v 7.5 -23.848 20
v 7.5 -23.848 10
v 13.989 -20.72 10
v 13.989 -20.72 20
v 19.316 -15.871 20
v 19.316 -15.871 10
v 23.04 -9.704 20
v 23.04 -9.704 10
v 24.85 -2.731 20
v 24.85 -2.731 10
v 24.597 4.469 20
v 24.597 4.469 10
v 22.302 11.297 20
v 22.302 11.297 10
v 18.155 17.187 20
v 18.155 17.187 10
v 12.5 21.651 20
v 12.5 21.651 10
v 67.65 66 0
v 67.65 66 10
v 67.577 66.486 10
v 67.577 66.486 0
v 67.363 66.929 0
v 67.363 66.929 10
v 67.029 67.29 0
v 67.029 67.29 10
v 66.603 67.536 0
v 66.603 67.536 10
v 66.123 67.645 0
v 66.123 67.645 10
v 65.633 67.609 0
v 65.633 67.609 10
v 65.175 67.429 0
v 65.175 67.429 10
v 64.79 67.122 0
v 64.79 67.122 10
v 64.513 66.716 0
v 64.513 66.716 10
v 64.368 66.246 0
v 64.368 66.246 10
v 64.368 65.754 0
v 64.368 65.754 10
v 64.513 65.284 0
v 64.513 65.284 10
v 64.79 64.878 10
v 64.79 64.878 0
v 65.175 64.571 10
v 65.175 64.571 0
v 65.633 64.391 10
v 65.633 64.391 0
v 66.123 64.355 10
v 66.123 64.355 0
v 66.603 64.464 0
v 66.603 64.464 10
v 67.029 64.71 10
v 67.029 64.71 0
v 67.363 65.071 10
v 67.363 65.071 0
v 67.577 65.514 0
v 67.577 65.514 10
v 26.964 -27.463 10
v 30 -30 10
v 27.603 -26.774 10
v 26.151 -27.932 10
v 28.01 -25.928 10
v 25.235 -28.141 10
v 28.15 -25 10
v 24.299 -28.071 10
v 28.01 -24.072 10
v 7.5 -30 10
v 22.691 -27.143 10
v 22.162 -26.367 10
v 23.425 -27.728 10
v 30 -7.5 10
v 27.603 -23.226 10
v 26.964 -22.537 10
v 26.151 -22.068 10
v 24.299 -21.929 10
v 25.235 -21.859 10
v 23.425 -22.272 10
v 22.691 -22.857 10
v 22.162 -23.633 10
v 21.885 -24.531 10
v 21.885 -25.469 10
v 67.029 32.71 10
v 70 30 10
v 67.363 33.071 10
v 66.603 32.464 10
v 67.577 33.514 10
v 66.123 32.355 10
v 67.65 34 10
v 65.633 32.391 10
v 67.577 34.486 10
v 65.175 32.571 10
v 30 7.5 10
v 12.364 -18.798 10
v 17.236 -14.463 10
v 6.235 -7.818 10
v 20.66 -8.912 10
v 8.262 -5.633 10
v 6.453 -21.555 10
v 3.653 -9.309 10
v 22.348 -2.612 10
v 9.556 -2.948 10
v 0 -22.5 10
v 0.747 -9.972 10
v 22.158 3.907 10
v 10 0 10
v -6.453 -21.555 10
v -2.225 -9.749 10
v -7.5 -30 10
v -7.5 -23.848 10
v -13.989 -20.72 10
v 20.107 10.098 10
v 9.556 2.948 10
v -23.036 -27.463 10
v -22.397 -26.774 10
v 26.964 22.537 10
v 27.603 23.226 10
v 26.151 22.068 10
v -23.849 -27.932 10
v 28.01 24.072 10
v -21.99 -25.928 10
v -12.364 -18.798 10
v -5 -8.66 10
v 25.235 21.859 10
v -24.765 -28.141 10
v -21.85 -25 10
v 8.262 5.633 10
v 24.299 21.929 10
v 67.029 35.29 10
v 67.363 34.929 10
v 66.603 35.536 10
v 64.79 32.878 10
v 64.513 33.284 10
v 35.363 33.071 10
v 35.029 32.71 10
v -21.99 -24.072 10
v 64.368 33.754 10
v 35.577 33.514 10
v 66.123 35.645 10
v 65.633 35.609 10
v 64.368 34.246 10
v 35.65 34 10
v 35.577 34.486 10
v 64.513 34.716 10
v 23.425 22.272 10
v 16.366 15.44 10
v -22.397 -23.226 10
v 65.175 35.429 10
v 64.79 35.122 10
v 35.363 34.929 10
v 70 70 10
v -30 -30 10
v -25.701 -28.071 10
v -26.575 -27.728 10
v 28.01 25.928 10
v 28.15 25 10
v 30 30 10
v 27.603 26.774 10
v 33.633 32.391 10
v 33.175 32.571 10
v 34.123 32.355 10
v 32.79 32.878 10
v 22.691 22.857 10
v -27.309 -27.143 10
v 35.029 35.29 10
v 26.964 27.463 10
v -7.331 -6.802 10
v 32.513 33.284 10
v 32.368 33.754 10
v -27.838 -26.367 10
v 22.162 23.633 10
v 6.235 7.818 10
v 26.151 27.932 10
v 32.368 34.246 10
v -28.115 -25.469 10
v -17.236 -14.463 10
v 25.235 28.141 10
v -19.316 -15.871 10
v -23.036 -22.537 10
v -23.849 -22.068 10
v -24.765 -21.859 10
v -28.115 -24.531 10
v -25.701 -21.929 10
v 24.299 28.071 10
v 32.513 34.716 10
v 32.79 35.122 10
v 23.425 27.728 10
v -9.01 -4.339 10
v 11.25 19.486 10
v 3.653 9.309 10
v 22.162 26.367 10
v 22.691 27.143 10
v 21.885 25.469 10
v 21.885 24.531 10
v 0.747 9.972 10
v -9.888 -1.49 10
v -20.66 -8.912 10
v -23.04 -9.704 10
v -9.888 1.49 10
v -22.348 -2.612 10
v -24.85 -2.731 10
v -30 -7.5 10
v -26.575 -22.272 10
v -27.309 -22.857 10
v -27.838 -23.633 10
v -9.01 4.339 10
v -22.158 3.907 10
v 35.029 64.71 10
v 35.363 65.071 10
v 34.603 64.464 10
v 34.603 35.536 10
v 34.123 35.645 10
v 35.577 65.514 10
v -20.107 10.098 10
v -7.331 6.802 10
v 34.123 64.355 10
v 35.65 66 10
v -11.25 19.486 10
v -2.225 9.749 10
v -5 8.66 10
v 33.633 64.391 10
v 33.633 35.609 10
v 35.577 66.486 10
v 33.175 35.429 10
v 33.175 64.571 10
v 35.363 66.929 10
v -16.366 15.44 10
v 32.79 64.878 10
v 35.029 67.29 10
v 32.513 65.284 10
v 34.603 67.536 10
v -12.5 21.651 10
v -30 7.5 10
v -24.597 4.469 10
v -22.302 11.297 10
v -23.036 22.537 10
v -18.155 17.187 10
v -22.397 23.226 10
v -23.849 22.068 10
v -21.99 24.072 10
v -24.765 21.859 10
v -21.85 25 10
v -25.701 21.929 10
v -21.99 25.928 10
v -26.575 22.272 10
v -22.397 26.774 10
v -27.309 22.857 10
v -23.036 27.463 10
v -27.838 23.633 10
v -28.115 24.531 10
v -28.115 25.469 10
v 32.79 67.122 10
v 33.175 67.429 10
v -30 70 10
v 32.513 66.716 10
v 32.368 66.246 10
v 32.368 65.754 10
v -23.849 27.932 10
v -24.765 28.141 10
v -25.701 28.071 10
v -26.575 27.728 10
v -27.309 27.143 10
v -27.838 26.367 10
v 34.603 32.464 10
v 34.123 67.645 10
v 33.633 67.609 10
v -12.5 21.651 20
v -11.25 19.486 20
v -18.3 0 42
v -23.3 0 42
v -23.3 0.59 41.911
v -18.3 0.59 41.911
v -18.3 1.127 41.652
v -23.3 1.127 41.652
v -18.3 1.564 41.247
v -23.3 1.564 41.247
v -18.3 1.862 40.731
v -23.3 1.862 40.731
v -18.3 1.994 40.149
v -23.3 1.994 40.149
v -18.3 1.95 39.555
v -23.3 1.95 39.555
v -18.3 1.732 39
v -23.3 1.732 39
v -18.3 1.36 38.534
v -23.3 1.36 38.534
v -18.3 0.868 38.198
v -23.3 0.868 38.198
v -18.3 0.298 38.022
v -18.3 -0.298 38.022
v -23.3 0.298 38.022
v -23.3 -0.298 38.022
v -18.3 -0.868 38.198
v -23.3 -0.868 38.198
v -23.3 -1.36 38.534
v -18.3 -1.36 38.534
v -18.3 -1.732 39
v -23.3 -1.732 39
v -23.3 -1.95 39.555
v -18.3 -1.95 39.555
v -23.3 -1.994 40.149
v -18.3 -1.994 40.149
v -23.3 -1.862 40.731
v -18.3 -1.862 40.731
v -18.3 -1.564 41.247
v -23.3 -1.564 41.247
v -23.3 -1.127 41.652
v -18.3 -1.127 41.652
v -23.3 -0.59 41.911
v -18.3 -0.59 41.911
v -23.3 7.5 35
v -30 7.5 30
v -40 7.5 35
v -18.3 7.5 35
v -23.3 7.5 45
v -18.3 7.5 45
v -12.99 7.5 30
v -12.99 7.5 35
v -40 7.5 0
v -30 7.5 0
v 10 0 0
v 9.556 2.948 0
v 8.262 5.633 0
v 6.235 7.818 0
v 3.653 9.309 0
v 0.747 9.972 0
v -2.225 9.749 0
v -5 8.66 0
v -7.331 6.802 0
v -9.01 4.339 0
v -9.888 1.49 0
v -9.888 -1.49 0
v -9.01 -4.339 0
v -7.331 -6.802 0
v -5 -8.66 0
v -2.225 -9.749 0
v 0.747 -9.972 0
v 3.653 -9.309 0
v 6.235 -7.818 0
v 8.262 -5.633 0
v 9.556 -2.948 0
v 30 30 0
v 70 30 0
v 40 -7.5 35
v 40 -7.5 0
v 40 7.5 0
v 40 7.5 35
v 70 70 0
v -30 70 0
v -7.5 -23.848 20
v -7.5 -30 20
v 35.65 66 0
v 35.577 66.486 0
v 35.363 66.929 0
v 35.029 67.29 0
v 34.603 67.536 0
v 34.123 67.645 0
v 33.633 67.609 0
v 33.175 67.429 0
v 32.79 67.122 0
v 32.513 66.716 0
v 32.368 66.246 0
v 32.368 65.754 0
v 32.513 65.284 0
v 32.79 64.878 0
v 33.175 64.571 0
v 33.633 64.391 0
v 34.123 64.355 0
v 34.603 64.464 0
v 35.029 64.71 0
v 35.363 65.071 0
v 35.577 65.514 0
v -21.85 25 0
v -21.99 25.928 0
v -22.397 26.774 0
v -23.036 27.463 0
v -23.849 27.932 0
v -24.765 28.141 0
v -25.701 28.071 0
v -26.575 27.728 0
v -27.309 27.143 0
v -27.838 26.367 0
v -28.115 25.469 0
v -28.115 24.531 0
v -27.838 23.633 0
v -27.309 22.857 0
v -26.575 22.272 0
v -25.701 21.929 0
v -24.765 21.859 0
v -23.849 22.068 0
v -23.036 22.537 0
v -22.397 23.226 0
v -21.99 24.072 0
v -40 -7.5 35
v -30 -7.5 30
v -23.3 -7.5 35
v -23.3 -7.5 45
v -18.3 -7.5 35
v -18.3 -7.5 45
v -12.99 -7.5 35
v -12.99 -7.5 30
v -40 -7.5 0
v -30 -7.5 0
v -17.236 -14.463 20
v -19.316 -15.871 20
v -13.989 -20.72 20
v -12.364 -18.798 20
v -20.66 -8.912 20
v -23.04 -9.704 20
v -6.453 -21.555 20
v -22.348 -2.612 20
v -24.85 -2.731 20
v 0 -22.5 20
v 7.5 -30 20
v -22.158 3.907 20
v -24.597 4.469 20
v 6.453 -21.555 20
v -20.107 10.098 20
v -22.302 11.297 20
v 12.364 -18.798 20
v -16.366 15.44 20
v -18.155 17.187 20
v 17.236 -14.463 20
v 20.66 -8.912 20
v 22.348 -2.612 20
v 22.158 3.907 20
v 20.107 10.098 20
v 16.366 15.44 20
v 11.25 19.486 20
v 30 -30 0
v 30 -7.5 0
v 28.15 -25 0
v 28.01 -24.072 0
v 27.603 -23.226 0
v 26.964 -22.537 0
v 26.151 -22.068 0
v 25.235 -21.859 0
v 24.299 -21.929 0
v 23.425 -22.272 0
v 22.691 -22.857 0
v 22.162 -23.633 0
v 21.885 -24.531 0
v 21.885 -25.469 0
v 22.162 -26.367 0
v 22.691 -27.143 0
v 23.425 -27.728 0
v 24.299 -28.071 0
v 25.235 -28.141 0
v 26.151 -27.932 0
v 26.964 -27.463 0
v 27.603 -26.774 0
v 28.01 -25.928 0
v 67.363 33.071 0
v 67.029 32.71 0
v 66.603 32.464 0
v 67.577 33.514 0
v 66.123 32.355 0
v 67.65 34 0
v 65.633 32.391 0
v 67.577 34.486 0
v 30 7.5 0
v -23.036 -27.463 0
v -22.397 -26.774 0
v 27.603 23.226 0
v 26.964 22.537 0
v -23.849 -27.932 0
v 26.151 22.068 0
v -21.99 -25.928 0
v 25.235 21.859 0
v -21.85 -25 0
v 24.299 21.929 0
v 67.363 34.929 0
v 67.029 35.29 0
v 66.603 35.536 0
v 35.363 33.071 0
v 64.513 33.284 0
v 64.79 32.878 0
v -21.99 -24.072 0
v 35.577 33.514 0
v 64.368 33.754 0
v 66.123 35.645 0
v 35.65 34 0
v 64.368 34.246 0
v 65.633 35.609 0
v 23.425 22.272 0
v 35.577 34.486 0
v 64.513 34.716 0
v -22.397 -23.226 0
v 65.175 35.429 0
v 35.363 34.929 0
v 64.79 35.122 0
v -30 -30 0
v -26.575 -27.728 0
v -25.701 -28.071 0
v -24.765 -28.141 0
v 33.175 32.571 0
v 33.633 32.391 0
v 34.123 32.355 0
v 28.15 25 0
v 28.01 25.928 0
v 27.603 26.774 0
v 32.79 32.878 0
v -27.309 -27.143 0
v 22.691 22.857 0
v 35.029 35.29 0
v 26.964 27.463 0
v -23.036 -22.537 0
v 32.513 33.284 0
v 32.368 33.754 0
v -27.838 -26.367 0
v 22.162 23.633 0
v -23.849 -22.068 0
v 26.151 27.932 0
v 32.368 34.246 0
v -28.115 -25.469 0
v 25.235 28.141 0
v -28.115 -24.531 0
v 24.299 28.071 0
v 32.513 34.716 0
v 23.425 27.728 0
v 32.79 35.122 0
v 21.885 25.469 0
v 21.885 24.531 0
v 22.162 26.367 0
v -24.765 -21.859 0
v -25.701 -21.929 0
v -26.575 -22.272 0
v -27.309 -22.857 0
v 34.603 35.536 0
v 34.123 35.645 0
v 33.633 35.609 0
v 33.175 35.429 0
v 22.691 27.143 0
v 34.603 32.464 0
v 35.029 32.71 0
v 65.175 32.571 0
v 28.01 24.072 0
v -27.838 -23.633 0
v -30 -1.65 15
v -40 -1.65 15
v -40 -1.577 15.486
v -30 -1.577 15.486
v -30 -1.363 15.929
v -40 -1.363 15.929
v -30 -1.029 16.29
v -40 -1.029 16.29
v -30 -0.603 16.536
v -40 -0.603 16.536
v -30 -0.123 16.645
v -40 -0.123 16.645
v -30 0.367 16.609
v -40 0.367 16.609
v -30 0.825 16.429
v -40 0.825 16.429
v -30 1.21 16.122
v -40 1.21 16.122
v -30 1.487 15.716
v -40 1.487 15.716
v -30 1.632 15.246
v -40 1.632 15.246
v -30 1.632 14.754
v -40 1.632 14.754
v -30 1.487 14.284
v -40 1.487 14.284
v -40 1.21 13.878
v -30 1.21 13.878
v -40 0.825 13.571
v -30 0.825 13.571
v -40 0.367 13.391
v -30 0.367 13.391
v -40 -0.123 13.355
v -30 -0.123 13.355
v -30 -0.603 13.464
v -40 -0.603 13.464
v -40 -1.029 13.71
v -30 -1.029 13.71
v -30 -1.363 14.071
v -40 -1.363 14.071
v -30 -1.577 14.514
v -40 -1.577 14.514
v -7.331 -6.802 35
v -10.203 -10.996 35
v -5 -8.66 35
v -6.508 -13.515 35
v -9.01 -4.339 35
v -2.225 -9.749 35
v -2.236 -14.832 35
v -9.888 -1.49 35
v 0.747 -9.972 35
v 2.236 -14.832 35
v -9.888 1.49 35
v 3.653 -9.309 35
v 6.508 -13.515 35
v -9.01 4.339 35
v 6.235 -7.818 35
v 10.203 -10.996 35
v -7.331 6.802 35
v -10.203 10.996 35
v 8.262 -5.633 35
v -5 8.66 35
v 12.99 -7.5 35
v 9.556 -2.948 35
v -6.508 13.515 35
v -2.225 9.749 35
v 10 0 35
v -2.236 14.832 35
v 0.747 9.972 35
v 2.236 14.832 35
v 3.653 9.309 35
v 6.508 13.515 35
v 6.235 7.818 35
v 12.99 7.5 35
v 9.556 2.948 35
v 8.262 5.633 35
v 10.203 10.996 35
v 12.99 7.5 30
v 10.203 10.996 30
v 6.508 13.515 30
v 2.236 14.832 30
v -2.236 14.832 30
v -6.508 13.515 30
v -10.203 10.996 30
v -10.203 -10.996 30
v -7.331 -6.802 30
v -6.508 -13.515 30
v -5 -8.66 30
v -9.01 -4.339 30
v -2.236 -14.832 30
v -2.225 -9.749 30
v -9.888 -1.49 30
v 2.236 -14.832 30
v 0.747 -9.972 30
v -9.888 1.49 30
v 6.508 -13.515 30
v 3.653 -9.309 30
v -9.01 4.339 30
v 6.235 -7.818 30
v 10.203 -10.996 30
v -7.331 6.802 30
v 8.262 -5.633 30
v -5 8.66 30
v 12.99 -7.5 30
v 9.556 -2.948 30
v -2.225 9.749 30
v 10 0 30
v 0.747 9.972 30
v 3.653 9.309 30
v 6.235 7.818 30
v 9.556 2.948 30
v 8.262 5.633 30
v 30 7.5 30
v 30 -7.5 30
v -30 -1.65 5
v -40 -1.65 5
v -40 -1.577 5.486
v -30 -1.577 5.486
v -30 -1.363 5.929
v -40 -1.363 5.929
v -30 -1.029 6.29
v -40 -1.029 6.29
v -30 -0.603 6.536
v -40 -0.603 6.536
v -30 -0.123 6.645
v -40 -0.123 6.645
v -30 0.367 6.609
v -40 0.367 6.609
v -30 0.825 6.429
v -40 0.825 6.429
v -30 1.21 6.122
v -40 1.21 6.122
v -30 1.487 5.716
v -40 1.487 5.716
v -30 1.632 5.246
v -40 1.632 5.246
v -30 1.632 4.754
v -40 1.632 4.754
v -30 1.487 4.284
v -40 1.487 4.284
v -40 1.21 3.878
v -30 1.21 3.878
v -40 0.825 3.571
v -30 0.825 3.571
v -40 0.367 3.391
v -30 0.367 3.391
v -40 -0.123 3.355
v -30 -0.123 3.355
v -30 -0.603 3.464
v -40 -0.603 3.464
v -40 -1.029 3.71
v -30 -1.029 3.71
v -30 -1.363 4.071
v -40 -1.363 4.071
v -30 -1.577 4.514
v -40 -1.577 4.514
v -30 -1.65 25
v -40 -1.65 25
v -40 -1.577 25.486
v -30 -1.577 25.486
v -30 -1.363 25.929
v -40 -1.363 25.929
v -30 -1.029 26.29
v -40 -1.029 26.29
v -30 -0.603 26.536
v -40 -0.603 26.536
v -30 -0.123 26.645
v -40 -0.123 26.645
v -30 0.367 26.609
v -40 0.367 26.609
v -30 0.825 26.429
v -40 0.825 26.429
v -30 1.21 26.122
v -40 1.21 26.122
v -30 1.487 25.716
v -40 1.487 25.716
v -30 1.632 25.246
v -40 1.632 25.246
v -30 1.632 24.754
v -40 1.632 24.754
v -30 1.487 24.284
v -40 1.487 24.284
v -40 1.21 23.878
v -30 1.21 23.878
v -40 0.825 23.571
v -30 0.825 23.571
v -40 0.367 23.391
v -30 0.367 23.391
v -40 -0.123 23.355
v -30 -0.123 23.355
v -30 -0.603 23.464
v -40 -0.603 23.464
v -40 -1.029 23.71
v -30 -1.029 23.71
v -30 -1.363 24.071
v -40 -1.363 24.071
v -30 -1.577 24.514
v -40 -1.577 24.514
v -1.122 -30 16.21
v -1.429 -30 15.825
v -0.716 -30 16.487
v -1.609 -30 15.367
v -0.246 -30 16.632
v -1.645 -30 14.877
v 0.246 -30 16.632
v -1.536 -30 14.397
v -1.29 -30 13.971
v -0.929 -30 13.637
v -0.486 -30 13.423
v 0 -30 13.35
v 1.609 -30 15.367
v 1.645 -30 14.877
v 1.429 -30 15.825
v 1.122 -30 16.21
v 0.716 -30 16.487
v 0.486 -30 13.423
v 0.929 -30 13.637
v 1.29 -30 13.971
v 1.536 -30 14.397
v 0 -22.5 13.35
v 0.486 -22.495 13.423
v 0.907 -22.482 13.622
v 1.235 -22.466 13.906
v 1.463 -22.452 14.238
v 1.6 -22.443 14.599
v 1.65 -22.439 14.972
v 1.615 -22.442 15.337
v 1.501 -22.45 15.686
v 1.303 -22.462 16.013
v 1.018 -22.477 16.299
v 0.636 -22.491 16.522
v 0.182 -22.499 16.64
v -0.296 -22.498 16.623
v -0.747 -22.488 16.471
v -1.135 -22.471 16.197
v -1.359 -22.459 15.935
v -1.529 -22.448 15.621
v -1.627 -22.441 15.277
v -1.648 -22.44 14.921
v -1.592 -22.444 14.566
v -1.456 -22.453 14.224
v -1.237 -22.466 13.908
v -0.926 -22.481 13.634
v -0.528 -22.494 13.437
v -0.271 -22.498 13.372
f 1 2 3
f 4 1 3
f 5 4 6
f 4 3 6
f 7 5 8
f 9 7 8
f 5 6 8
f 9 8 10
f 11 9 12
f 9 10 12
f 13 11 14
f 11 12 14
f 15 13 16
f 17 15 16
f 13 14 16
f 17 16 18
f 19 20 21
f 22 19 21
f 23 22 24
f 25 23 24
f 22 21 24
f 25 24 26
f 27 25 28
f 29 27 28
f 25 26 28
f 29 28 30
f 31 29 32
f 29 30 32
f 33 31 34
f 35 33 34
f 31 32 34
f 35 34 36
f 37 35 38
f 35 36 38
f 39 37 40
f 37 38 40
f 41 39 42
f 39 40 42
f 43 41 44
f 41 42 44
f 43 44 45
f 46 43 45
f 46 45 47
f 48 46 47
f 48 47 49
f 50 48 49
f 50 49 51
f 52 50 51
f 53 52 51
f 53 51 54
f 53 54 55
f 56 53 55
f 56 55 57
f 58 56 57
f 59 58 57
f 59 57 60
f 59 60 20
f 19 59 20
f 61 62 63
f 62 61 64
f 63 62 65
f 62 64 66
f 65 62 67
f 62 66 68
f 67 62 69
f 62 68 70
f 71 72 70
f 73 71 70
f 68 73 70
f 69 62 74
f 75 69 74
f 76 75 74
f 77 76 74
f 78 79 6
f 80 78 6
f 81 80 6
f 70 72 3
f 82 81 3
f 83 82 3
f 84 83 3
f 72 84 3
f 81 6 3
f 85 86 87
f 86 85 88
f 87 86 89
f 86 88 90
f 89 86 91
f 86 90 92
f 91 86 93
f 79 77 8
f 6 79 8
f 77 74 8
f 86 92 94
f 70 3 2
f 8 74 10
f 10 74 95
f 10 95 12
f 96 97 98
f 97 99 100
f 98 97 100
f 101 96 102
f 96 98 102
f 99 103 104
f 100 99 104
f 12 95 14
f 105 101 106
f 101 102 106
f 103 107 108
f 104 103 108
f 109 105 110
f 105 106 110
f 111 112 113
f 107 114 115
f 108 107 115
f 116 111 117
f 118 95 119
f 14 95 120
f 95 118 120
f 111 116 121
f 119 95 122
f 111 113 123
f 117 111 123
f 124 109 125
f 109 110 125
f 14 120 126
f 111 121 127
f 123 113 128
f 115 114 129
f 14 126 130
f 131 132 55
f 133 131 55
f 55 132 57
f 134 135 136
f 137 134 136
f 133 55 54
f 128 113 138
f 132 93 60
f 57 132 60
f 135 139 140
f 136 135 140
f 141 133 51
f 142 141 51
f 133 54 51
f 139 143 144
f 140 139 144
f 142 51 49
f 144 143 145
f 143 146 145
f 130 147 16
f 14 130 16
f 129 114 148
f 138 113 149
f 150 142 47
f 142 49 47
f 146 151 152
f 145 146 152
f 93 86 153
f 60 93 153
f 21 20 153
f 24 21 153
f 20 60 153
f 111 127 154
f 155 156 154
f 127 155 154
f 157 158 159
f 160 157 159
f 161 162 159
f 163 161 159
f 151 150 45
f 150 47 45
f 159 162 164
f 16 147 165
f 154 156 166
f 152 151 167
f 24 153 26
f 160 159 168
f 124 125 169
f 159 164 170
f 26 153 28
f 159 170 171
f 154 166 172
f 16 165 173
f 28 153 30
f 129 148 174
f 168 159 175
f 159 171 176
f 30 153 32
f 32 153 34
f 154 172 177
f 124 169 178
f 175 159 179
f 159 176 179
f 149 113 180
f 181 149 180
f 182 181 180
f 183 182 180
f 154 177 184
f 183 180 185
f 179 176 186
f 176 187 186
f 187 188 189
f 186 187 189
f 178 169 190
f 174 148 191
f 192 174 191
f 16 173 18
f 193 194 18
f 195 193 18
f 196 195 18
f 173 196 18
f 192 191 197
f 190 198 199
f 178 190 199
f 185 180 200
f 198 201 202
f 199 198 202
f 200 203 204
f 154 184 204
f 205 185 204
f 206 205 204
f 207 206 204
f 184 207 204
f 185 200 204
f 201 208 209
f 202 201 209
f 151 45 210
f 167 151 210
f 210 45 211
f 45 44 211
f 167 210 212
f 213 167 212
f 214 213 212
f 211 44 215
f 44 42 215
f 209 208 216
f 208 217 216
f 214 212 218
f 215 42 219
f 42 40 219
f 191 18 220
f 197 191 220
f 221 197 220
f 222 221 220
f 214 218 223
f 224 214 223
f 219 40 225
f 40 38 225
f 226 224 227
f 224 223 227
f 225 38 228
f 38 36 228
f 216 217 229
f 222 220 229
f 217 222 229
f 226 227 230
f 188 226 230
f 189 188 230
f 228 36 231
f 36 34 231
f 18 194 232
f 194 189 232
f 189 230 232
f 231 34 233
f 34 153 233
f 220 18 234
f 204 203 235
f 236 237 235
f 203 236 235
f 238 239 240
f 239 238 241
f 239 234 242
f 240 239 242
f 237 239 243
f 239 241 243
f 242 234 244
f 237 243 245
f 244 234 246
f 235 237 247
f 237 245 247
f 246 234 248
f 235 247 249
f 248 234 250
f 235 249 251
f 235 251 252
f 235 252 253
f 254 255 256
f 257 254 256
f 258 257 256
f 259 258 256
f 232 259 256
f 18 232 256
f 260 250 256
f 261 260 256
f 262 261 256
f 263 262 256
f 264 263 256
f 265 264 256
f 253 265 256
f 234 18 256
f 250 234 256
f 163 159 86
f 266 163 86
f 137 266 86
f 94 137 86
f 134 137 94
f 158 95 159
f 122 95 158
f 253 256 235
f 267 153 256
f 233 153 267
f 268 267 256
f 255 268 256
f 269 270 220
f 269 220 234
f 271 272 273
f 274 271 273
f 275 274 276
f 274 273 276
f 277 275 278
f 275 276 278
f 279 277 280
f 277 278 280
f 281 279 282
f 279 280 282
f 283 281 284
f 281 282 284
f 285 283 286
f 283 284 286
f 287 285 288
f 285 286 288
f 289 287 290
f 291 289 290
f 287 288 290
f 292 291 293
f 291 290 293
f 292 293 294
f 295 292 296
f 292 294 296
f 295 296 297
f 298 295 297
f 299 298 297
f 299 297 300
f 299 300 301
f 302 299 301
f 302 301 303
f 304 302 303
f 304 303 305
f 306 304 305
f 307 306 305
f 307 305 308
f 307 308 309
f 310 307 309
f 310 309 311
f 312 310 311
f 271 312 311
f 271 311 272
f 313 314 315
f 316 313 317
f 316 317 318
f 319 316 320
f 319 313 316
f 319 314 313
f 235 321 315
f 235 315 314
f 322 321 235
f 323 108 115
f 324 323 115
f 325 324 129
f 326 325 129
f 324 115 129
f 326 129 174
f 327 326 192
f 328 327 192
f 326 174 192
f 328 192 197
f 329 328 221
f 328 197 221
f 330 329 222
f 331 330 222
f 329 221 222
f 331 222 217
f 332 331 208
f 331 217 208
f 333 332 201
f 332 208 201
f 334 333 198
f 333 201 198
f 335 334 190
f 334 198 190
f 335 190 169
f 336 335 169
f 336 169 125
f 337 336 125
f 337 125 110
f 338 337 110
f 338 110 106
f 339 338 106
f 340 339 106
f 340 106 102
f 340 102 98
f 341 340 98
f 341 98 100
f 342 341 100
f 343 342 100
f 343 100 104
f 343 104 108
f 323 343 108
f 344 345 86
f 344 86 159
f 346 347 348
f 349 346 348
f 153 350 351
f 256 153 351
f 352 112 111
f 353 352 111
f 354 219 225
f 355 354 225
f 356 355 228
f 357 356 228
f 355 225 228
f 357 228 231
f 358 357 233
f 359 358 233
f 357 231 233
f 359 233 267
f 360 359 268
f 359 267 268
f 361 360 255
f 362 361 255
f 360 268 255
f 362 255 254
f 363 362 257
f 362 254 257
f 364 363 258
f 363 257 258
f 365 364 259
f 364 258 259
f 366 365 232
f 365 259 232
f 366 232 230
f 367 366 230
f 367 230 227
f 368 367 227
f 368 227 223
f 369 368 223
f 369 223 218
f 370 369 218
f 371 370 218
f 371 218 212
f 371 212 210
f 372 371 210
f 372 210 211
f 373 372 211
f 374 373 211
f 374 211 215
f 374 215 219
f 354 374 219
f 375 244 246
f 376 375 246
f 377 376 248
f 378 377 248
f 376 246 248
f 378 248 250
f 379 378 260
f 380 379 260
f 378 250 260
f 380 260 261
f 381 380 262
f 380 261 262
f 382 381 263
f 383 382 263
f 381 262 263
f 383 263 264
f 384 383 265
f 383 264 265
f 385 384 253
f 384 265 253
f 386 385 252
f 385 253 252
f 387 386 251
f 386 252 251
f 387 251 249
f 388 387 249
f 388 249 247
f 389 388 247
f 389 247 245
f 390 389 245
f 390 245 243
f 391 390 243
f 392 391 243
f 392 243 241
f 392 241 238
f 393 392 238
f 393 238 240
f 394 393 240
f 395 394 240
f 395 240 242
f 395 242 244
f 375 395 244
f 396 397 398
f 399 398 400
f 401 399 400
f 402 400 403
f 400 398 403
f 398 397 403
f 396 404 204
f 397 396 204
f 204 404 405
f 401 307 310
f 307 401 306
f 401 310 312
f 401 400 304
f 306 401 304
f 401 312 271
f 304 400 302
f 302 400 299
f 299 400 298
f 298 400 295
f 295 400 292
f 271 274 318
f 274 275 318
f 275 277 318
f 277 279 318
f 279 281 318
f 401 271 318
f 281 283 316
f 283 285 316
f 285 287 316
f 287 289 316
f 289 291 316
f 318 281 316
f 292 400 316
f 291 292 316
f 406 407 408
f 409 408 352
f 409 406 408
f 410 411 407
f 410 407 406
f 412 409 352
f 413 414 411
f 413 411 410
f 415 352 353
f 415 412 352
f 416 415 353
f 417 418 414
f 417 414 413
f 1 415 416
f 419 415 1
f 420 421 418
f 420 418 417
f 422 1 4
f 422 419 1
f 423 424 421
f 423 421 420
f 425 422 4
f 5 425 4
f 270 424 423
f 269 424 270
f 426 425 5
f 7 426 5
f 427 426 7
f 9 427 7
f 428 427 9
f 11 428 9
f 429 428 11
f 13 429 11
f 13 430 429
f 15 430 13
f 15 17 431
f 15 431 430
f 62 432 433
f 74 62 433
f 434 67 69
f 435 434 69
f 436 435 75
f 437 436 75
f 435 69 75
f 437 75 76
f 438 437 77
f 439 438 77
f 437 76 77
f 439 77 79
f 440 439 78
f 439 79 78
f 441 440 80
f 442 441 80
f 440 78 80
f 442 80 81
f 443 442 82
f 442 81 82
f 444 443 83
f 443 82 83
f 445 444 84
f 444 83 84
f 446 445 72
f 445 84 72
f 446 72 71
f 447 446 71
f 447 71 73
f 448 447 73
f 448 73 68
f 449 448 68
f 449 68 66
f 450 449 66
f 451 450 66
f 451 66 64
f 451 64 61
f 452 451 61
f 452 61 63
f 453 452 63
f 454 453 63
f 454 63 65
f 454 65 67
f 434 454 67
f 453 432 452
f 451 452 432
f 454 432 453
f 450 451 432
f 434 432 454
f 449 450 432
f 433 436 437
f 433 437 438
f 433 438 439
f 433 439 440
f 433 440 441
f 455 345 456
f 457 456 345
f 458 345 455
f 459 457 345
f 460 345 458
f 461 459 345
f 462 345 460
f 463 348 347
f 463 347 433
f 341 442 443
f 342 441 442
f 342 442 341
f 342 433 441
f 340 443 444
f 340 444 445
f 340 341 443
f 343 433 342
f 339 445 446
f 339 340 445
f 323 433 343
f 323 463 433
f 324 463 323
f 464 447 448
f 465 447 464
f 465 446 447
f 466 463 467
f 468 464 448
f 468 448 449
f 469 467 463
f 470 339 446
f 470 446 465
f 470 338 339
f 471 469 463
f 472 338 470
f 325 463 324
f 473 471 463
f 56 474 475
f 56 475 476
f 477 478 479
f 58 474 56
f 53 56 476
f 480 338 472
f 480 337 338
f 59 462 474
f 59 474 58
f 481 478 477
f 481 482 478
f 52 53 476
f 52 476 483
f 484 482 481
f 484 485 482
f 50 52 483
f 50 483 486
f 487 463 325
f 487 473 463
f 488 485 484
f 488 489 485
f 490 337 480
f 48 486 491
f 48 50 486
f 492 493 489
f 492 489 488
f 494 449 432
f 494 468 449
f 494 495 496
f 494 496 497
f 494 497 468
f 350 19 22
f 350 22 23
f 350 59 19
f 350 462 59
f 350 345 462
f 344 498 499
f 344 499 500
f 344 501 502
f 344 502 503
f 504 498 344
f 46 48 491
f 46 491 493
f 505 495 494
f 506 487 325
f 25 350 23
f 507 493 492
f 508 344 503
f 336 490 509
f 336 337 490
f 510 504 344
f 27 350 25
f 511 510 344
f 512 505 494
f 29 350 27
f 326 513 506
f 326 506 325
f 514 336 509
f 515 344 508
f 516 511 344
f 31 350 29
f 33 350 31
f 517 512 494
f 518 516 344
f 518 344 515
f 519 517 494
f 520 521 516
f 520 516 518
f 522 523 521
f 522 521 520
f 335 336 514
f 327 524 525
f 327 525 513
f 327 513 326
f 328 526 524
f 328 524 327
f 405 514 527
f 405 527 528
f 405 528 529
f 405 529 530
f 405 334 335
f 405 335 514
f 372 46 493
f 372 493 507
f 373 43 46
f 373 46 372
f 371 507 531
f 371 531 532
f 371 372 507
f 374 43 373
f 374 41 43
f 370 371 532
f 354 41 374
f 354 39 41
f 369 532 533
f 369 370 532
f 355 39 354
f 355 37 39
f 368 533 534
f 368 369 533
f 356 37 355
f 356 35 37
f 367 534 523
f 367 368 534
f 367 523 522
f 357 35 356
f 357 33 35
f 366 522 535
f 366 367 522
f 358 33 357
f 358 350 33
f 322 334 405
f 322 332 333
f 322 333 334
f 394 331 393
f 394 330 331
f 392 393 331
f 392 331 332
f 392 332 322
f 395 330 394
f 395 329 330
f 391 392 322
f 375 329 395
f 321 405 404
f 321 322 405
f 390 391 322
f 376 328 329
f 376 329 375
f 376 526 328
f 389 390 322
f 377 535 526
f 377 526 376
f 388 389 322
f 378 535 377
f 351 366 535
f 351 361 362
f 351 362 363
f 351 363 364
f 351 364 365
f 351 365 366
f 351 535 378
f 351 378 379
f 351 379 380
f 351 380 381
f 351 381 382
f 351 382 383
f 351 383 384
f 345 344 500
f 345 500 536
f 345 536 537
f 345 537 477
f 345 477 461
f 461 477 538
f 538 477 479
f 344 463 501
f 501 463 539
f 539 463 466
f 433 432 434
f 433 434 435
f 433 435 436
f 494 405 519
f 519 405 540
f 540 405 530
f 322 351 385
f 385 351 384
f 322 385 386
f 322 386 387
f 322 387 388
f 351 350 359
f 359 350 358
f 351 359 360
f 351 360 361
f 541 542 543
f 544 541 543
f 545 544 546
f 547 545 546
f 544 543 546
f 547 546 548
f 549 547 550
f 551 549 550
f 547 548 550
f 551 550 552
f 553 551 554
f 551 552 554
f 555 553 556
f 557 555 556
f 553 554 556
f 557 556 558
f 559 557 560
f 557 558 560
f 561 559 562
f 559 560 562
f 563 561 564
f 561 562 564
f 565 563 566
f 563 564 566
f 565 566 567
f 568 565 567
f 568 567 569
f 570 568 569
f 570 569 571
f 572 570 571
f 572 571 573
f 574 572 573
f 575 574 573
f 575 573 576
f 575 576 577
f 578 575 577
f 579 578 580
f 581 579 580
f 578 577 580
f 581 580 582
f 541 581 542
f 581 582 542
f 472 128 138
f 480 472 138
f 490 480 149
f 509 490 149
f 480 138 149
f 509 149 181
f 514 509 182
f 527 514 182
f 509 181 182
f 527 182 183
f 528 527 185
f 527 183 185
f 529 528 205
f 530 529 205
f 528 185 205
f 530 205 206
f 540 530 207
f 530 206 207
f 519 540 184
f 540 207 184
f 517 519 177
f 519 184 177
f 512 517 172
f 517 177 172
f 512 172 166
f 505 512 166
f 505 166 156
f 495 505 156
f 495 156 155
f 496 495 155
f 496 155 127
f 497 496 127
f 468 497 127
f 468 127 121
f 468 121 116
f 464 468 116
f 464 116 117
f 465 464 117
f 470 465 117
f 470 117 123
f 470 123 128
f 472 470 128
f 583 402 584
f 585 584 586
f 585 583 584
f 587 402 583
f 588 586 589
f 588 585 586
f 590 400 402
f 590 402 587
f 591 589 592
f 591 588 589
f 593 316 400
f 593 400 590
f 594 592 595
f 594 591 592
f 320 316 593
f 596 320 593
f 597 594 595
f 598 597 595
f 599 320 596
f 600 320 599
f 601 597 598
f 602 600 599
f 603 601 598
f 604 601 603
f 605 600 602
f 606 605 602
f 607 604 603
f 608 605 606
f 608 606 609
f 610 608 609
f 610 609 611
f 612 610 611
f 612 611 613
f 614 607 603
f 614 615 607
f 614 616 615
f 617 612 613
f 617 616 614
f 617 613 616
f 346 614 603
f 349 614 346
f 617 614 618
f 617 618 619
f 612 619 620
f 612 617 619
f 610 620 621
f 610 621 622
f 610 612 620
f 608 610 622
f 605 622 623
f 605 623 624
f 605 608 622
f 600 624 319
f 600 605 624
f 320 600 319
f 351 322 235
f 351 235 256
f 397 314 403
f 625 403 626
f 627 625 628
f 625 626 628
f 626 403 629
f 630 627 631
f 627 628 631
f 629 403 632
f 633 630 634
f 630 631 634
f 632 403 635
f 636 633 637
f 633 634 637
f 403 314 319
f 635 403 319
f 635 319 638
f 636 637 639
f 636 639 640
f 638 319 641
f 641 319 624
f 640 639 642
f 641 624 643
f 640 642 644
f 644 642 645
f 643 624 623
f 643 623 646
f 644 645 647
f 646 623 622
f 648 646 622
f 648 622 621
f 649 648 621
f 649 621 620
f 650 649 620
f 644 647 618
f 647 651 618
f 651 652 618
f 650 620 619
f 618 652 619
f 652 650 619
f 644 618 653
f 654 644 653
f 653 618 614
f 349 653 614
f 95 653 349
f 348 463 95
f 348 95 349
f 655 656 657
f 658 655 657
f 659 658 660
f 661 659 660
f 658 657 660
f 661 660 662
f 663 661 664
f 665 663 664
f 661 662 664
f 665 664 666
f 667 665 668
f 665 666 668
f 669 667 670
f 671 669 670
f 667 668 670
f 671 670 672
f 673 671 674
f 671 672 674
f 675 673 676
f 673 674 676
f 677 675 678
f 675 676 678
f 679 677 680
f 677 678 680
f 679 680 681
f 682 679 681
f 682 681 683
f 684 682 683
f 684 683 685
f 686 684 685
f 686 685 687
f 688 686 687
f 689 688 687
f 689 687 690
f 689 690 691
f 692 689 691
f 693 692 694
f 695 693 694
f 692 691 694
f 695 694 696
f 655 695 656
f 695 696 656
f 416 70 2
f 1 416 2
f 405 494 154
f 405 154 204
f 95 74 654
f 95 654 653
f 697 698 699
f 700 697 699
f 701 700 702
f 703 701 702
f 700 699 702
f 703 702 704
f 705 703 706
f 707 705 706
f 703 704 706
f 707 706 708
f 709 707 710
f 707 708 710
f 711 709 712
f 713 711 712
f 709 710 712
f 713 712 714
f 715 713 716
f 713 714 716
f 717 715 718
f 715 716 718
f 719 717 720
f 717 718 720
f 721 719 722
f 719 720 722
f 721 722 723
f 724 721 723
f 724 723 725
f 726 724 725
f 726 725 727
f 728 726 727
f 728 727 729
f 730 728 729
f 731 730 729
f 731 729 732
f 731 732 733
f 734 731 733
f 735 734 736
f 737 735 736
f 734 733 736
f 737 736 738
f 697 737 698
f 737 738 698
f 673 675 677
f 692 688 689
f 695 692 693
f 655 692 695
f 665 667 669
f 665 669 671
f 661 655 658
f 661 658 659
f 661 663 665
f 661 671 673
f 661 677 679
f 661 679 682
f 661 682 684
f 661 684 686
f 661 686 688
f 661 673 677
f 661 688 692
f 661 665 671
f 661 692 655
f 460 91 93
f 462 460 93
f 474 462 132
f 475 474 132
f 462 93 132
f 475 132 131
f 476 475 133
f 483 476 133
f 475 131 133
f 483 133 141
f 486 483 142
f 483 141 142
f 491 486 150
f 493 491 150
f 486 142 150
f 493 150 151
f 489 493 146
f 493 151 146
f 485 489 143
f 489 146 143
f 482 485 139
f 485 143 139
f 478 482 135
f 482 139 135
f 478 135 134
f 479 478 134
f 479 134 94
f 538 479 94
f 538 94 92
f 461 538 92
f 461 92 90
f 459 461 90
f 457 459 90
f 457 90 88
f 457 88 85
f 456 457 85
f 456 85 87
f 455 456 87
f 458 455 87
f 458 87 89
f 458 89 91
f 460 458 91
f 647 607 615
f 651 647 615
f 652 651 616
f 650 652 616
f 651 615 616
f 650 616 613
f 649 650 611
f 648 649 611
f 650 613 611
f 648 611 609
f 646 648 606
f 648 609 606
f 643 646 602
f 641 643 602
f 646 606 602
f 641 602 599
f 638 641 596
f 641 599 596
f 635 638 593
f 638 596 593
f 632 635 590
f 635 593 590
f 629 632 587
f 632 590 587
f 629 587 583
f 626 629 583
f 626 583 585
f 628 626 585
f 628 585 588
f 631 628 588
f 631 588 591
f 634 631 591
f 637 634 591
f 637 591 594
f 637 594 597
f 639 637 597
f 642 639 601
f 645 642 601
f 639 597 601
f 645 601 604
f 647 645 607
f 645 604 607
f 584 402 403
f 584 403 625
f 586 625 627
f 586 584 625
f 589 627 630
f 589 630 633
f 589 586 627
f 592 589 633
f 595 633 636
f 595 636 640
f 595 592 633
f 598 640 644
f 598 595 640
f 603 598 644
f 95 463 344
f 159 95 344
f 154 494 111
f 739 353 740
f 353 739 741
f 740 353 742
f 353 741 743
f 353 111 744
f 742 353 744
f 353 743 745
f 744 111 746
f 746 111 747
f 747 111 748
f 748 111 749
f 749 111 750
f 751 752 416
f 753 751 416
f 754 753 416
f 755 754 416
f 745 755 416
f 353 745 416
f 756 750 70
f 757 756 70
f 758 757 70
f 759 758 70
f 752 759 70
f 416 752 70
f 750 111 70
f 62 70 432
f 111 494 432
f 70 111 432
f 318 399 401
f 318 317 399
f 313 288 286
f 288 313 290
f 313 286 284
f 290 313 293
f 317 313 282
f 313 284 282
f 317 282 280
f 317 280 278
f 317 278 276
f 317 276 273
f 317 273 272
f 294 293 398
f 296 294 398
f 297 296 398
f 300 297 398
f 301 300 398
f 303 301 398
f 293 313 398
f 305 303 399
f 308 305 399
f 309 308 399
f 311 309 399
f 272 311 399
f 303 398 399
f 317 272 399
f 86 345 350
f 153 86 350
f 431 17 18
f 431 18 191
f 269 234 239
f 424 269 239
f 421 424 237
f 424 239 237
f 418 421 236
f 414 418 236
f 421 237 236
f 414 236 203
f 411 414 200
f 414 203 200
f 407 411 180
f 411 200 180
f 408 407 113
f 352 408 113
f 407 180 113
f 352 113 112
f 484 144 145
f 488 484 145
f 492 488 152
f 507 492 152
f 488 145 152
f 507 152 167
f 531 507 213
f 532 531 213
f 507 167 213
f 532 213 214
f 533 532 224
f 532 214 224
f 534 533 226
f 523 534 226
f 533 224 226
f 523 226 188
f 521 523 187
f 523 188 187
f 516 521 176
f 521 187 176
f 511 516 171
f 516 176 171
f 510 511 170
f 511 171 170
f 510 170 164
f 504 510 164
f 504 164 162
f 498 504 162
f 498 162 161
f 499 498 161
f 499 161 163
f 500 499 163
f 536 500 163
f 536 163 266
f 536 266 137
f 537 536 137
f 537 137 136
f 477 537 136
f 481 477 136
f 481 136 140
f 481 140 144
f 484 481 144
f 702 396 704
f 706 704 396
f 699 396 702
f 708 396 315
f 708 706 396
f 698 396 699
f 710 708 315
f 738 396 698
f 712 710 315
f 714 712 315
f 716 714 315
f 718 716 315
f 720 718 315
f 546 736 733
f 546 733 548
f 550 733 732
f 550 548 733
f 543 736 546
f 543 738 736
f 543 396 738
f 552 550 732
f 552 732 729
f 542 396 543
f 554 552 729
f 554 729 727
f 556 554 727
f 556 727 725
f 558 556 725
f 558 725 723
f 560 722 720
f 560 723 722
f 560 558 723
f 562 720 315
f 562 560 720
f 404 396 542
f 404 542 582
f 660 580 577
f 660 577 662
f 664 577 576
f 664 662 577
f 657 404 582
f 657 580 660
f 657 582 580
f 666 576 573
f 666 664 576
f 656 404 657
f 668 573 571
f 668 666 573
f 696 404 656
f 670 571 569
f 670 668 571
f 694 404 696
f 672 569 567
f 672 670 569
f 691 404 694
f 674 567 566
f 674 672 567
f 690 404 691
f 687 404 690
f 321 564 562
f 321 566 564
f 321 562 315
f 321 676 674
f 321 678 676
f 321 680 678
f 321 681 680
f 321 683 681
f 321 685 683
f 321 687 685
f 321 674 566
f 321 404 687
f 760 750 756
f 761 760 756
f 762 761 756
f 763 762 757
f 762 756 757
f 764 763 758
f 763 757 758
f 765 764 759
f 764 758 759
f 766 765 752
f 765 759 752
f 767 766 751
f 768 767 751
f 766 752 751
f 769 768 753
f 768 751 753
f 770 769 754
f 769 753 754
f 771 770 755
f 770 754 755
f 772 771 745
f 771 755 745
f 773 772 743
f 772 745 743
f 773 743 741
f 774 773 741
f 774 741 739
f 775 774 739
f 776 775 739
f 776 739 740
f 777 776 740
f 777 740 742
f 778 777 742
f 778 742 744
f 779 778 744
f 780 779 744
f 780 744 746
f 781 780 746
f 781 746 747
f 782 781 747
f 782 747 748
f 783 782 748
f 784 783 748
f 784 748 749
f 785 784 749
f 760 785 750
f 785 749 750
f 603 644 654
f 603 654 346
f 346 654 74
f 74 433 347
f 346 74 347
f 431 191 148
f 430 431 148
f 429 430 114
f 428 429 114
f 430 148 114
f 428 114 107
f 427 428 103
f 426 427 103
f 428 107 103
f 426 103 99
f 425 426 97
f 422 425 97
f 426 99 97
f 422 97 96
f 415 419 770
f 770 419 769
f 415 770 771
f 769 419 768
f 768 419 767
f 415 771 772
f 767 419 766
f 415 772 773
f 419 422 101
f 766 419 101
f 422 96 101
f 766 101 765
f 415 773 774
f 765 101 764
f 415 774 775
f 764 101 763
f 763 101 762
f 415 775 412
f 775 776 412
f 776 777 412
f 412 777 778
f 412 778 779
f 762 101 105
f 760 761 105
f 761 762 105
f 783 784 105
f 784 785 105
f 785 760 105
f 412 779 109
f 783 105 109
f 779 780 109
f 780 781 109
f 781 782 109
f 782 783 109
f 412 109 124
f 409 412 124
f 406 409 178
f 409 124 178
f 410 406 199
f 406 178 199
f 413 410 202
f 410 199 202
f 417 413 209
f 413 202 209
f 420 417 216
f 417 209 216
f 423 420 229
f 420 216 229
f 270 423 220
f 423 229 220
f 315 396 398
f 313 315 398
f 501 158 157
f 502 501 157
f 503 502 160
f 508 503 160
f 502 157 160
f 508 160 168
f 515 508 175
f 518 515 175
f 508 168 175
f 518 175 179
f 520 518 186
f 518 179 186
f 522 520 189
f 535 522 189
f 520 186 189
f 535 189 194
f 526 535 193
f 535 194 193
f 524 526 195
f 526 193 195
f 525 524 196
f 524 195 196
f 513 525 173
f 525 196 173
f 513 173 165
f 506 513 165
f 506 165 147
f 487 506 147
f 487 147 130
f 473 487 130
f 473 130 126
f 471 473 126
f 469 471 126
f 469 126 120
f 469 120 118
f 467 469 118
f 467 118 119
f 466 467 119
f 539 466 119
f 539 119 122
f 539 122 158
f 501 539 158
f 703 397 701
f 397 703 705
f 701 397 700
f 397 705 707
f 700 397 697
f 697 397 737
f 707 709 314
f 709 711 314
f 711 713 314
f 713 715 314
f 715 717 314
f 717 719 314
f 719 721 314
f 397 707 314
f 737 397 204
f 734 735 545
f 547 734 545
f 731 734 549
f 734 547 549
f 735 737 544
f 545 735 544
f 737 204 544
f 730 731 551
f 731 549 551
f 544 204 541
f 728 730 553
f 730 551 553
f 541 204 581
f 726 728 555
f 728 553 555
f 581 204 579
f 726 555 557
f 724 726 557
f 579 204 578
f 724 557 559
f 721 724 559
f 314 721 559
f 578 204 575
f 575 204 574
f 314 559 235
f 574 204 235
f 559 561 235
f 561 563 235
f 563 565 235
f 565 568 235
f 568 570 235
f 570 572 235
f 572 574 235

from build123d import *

# Parameters (mm, degrees)
SKETCH1_W               = 60
SKETCH1_H               = 60
BOSS_EXTRUDE1_DEPTH     = 10
BOSS_EXTRUDE2_DEPTH     = 10
SKETCH3_R               = 10
CUT_EXTRUDE1_DEPTH      = 44.588989435
SKETCH4_R               = 3.15
CUT_EXTRUDE2_DEPTH      = 44.588989435
SKETCH5_W               = 10
SKETCH5_H               = 15
BOSS_EXTRUDE3_DEPTH     = 45
BOSS_EXTRUDE4_START     = 5
SKETCH6_R               = 10
BOSS_EXTRUDE4_DEPTH     = 5
CUT_EXTRUDE4_REACH      = 87
CUT_EXTRUDE4_END_RADIUS = 22.5
SKETCH7_R               = 1.65
SKETCH8_W               = 11.7
SKETCH8_H               = 15
BOSS_EXTRUDE5_DEPTH     = 10
SKETCH9_W               = 16.7
SKETCH9_H               = 10
CUT_EXTRUDE5_DEPTH      = 71.931304796
CUT_EXTRUDE6_REACH      = 85.258
SKETCH11_R              = 2
SKETCH12_W              = 10
SKETCH12_H              = 15
CUT_EXTRUDE7_DEPTH      = 10
SKETCH15_R              = 1.65
CUT_EXTRUDE8_DEPTH      = 10
LPATTERN1_COUNT         = 3
LPATTERN1_PITCH         = 10
SKETCH16_W              = 100
SKETCH16_H              = 40
BOSS_EXTRUDE6_DEPTH     = 10
SKETCH17_R              = 1.65
CUT_EXTRUDE9_DEPTH      = 106


with BuildPart() as part:
    # Sketch1 → Boss-Extrude1 (new body)
    with BuildSketch(Plane.XY):
        Rectangle(SKETCH1_W, SKETCH1_H)
    extrude(amount=BOSS_EXTRUDE1_DEPTH)

    # Sketch2 → Boss-Extrude2 (add)
    with BuildSketch(Plane.XY.offset(10)):
        with BuildLine():
            Line((-11.25, 19.485571585), (-12.5, 21.650635095))
            ThreePointArc((-12.5, 21.650635095), (-24.850399784, -2.730866272), (-7.5, -23.848480035))
            Line((-7.5, -23.848480035), (-7.5, -30))
            Line((-7.5, -30), (7.5, -30))
            Line((7.5, -30), (7.5, -23.848480035))
            ThreePointArc((7.5, -23.848480035), (24.850399784, -2.730866272), (12.5, 21.650635095))
            Line((12.5, 21.650635095), (11.25, 19.485571585))
            ThreePointArc((11.25, 19.485571585), (0, -22.5), (-11.25, 19.485571585))
        make_face()
    extrude(amount=BOSS_EXTRUDE2_DEPTH)

    # Sketch3 → Cut-Extrude1 (cut, through all)
    with BuildSketch(Plane.XY.offset(10)):
        Circle(SKETCH3_R)
    extrude(amount=-CUT_EXTRUDE1_DEPTH, mode=Mode.SUBTRACT)

    # Sketch4 → Cut-Extrude2 (cut, through all)
    with BuildSketch(Plane.XY.offset(10)):
        with Locations((-25, 25)):
            Circle(SKETCH4_R)
        with Locations((25, 25)):
            Circle(SKETCH4_R)
        with Locations((25, -25)):
            Circle(SKETCH4_R)
        with Locations((-25, -25)):
            Circle(SKETCH4_R)
    extrude(amount=-CUT_EXTRUDE2_DEPTH, mode=Mode.SUBTRACT)

    # Sketch5 → Boss-Extrude3 (add)
    with BuildSketch(Plane(origin=(0, 0, 0), x_dir=(-1, 0, 0), z_dir=(0, 0, -1))):
        with Locations((35, 0)):
            Rectangle(SKETCH5_W, SKETCH5_H)
    boss_extrude3 = extrude(amount=-BOSS_EXTRUDE3_DEPTH)

    # Mirror1: Boss-Extrude3 across plane
    add(boss_extrude3.mirror(Plane.ZY))

    # Sketch6 → Boss-Extrude4 (add)
    with BuildSketch(Plane.XY.offset(30).offset(BOSS_EXTRUDE4_START)):
        with BuildLine():
            Line((30, 7.5), (12.990381057, 7.5))
            ThreePointArc((12.990381057, 7.5), (0, 15), (-12.990381057, 7.5))
            Line((-12.990381057, 7.5), (-30, 7.5))
            Line((-30, 7.5), (-30, -7.5))
            Line((-30, -7.5), (-12.990381057, -7.5))
            ThreePointArc((-12.990381057, -7.5), (0, -15), (12.990381057, -7.5))
            Line((12.990381057, -7.5), (30, -7.5))
            Line((30, -7.5), (30, 7.5))
        make_face()
        Circle(SKETCH6_R, mode=Mode.SUBTRACT)
    extrude(amount=-BOSS_EXTRUDE4_DEPTH)

    # Cut-Extrude4: up to this cylinder (the profile starts outside it)
    cut_extrude4_end = Plane(origin=(0, 0, 15), z_dir=(0, 0, -1)) * Cylinder(CUT_EXTRUDE4_END_RADIUS, 220, mode=Mode.PRIVATE)
    # Sketch7 → Cut-Extrude4 (cut, up to the surface)
    with BuildSketch(Plane(origin=(0, -30, 0), x_dir=(-1, 0, 0), z_dir=(0, -1, 0)), mode=Mode.PRIVATE) as cut_extrude4_sk1:
        with Locations(Location((0, -15, 0), (0, 0, 90))):
            Circle(SKETCH7_R)
    cut_extrude4_tool1 = extrude(cut_extrude4_sk1.sketch, amount=-CUT_EXTRUDE4_REACH, mode=Mode.PRIVATE) - cut_extrude4_end
    add(cut_extrude4_tool1.solids().sort_by_distance((0, -30, 15))[0], mode=Mode.SUBTRACT)

    # Sketch8 → Boss-Extrude5 (add)
    with BuildSketch(Plane.XY.offset(35)):
        with Locations((-24.15, 0)):
            Rectangle(SKETCH8_W, SKETCH8_H)
    extrude(amount=BOSS_EXTRUDE5_DEPTH)

    # Sketch9 → Cut-Extrude5 (cut, through all)
    with BuildSketch(Plane.XZ.offset(7.5)):
        with Locations((-31.65, 40)):
            Rectangle(SKETCH9_W, SKETCH9_H)
    extrude(amount=-CUT_EXTRUDE5_DEPTH, mode=Mode.SUBTRACT)

    # Sketch11 → Cut-Extrude6 (cut, up to next)
    with BuildSketch(Plane.ZY.offset(23.3), mode=Mode.PRIVATE) as cut_extrude6_sk1:
        with Locations((40, 0)):
            Circle(SKETCH11_R)
    cut_extrude6_tool1 = extrude(cut_extrude6_sk1.sketch, amount=-CUT_EXTRUDE6_REACH, mode=Mode.PRIVATE) & part.part
    add(cut_extrude6_tool1.solids().sort_by_distance((-23.3, 0, 40))[0], mode=Mode.SUBTRACT)

    # Sketch12 → Cut-Extrude7 (cut)
    with BuildSketch(Plane.ZY.offset(-30)):
        with Locations((40, 0)):
            Rectangle(SKETCH12_W, SKETCH12_H)
    extrude(amount=-CUT_EXTRUDE7_DEPTH, mode=Mode.SUBTRACT)

    # Sketch15 → Cut-Extrude8 (cut)
    with BuildSketch(Plane.ZY.offset(40)):
        with Locations(Location((5, 0, 0), (0, 0, 270))):
            Circle(SKETCH15_R)
    cut_extrude8 = extrude(amount=-CUT_EXTRUDE8_DEPTH, mode=Mode.SUBTRACT)

    # LPattern1: Cut-Extrude8 ×3
    with Locations(*[(0, 0, i * LPATTERN1_PITCH) for i in range(1, LPATTERN1_COUNT)]):
        add(cut_extrude8, mode=Mode.SUBTRACT)

    # Sketch16 → Boss-Extrude6 (add)
    with BuildSketch(Plane(origin=(0, 0, 0), x_dir=(-1, 0, 0), z_dir=(0, 0, -1))):
        with Locations((-20, 50)):
            Rectangle(SKETCH16_W, SKETCH16_H)
    extrude(amount=-BOSS_EXTRUDE6_DEPTH)

    # Sketch17 → Cut-Extrude9 (cut, through all)
    with BuildSketch(Plane.XY.offset(10)):
        with Locations((66, 34)):
            Circle(SKETCH17_R)
        with Locations((66, 66)):
            Circle(SKETCH17_R)
        with Locations((34, 66)):
            Circle(SKETCH17_R)
        with Locations((34, 34)):
            Circle(SKETCH17_R)
    extrude(amount=-CUT_EXTRUDE9_DEPTH, mode=Mode.SUBTRACT)


solid = part.part
